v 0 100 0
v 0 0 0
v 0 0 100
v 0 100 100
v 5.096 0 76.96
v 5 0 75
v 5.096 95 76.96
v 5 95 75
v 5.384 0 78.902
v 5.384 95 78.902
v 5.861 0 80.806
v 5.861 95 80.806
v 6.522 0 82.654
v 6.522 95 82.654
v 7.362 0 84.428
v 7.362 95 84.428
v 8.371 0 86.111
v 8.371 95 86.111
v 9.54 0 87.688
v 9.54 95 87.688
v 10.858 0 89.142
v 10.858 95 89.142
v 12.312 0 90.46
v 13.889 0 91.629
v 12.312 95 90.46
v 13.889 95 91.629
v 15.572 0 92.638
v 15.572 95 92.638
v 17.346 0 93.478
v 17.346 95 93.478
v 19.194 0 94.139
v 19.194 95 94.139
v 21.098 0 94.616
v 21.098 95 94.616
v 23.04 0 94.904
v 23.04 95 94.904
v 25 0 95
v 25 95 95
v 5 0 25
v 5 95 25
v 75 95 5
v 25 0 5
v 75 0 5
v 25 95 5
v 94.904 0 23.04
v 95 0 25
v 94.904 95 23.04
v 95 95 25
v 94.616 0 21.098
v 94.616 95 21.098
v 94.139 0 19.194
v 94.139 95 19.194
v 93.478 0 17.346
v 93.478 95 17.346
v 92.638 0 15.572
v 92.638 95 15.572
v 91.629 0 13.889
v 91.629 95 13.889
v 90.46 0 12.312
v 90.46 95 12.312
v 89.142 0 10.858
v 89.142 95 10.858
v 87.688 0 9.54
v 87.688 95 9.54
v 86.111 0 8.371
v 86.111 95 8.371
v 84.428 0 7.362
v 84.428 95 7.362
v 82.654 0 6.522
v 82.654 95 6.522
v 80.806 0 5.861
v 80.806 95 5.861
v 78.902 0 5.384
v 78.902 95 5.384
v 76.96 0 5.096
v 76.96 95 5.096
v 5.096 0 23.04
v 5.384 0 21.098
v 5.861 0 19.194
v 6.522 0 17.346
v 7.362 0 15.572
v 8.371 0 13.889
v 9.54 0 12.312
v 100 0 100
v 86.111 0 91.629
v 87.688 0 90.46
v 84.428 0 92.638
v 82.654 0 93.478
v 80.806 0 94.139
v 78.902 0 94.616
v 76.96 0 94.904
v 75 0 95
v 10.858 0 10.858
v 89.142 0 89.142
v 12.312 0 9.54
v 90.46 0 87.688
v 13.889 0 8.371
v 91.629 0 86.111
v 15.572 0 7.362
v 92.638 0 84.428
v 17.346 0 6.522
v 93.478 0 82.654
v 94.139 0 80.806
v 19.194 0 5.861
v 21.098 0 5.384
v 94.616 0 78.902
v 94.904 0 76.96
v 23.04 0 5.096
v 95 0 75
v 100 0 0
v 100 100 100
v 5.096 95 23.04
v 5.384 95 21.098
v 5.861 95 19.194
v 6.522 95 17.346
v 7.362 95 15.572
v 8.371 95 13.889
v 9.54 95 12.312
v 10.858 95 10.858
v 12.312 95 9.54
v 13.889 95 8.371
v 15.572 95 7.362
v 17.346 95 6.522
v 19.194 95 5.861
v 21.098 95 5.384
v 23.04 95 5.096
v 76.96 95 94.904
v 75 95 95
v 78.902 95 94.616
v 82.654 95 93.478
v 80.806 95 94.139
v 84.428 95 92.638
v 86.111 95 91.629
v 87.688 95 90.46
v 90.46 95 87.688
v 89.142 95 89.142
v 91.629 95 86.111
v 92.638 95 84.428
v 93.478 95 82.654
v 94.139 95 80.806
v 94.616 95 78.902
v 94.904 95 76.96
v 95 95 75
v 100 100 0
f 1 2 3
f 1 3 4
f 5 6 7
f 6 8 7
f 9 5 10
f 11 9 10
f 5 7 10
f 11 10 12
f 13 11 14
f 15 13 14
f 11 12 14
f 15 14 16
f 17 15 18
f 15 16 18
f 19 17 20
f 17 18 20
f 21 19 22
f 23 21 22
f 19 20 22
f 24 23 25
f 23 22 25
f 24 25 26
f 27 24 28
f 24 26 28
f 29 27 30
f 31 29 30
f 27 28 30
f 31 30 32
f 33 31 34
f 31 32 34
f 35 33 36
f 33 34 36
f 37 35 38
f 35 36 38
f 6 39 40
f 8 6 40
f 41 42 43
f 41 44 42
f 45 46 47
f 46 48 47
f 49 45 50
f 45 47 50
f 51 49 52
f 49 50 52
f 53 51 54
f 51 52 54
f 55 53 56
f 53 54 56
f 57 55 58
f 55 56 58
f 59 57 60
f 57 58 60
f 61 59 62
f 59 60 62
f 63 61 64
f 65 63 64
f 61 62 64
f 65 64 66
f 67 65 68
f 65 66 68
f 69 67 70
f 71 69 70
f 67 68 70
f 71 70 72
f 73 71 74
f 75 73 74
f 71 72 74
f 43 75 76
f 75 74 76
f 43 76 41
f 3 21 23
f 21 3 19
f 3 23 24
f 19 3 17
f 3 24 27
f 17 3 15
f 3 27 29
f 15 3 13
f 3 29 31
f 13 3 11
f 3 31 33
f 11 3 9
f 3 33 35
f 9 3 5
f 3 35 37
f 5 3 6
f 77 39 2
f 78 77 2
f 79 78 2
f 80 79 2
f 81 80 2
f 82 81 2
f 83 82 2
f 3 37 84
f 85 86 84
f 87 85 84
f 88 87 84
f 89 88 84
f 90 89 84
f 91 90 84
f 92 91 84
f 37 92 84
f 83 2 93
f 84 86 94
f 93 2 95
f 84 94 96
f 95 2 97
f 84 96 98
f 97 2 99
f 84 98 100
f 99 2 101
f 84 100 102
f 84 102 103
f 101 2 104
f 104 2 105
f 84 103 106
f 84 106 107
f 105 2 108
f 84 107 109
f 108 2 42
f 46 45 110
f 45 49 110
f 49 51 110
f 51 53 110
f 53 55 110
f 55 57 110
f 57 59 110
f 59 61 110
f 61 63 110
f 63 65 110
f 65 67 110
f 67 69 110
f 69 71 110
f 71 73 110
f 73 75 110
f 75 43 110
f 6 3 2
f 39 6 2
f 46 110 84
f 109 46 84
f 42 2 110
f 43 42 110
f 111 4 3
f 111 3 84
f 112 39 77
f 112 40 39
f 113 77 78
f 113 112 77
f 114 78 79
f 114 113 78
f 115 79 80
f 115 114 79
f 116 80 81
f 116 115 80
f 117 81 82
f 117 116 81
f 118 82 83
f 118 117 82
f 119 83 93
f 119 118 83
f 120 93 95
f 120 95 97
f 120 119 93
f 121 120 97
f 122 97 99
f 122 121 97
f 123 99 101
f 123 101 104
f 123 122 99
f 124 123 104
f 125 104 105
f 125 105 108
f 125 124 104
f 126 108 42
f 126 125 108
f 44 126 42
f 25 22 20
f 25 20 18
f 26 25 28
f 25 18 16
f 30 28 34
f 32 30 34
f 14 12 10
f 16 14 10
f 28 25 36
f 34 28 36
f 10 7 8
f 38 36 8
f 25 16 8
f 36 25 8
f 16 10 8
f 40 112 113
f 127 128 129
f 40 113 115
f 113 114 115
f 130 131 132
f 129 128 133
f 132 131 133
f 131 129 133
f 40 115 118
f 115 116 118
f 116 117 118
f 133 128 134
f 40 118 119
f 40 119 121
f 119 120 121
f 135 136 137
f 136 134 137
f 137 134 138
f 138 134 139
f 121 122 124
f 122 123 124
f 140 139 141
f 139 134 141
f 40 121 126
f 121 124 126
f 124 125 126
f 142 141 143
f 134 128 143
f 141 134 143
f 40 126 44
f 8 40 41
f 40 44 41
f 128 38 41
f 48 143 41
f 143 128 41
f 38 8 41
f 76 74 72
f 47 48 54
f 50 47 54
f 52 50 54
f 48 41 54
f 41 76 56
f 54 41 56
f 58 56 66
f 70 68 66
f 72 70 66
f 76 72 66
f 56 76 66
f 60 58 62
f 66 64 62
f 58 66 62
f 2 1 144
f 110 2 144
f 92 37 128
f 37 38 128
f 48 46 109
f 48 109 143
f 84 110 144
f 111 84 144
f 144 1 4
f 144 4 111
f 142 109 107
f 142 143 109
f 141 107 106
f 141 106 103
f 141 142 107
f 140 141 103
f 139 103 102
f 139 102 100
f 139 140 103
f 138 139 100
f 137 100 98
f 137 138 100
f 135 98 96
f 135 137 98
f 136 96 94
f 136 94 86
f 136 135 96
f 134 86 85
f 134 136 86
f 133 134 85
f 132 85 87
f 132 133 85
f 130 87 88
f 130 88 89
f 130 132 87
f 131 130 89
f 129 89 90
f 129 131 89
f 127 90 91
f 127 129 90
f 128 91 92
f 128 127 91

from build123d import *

# Parameters (mm, degrees)
F0_W     = 100
F0_H     = 100
F1_DEPTH = 100
F2_T     = -5
F3_R     = 20


with BuildPart() as f1:
    # F0 (on Top) → F1 (new body)
    with BuildSketch(Plane.XY):
        with Locations((50, 50)):
            Rectangle(F0_W, F0_H)
    extrude(amount=F1_DEPTH)

    # F2
    f2_openings = [f1.faces().sort_by_distance(p)[0] for p in [
        (50, 0, 50),
    ]]
    offset(amount=F2_T, openings=f2_openings)

    # F3
    f3_edges = [f1.edges().sort_by_distance(p)[0] for p in [
        (95, 47.5, 95),
        (95, 47.5, 5),
        (5, 47.5, 5),
        (5, 47.5, 95),
    ]]
    fillet(f3_edges, radius=F3_R)


solid = f1.part
